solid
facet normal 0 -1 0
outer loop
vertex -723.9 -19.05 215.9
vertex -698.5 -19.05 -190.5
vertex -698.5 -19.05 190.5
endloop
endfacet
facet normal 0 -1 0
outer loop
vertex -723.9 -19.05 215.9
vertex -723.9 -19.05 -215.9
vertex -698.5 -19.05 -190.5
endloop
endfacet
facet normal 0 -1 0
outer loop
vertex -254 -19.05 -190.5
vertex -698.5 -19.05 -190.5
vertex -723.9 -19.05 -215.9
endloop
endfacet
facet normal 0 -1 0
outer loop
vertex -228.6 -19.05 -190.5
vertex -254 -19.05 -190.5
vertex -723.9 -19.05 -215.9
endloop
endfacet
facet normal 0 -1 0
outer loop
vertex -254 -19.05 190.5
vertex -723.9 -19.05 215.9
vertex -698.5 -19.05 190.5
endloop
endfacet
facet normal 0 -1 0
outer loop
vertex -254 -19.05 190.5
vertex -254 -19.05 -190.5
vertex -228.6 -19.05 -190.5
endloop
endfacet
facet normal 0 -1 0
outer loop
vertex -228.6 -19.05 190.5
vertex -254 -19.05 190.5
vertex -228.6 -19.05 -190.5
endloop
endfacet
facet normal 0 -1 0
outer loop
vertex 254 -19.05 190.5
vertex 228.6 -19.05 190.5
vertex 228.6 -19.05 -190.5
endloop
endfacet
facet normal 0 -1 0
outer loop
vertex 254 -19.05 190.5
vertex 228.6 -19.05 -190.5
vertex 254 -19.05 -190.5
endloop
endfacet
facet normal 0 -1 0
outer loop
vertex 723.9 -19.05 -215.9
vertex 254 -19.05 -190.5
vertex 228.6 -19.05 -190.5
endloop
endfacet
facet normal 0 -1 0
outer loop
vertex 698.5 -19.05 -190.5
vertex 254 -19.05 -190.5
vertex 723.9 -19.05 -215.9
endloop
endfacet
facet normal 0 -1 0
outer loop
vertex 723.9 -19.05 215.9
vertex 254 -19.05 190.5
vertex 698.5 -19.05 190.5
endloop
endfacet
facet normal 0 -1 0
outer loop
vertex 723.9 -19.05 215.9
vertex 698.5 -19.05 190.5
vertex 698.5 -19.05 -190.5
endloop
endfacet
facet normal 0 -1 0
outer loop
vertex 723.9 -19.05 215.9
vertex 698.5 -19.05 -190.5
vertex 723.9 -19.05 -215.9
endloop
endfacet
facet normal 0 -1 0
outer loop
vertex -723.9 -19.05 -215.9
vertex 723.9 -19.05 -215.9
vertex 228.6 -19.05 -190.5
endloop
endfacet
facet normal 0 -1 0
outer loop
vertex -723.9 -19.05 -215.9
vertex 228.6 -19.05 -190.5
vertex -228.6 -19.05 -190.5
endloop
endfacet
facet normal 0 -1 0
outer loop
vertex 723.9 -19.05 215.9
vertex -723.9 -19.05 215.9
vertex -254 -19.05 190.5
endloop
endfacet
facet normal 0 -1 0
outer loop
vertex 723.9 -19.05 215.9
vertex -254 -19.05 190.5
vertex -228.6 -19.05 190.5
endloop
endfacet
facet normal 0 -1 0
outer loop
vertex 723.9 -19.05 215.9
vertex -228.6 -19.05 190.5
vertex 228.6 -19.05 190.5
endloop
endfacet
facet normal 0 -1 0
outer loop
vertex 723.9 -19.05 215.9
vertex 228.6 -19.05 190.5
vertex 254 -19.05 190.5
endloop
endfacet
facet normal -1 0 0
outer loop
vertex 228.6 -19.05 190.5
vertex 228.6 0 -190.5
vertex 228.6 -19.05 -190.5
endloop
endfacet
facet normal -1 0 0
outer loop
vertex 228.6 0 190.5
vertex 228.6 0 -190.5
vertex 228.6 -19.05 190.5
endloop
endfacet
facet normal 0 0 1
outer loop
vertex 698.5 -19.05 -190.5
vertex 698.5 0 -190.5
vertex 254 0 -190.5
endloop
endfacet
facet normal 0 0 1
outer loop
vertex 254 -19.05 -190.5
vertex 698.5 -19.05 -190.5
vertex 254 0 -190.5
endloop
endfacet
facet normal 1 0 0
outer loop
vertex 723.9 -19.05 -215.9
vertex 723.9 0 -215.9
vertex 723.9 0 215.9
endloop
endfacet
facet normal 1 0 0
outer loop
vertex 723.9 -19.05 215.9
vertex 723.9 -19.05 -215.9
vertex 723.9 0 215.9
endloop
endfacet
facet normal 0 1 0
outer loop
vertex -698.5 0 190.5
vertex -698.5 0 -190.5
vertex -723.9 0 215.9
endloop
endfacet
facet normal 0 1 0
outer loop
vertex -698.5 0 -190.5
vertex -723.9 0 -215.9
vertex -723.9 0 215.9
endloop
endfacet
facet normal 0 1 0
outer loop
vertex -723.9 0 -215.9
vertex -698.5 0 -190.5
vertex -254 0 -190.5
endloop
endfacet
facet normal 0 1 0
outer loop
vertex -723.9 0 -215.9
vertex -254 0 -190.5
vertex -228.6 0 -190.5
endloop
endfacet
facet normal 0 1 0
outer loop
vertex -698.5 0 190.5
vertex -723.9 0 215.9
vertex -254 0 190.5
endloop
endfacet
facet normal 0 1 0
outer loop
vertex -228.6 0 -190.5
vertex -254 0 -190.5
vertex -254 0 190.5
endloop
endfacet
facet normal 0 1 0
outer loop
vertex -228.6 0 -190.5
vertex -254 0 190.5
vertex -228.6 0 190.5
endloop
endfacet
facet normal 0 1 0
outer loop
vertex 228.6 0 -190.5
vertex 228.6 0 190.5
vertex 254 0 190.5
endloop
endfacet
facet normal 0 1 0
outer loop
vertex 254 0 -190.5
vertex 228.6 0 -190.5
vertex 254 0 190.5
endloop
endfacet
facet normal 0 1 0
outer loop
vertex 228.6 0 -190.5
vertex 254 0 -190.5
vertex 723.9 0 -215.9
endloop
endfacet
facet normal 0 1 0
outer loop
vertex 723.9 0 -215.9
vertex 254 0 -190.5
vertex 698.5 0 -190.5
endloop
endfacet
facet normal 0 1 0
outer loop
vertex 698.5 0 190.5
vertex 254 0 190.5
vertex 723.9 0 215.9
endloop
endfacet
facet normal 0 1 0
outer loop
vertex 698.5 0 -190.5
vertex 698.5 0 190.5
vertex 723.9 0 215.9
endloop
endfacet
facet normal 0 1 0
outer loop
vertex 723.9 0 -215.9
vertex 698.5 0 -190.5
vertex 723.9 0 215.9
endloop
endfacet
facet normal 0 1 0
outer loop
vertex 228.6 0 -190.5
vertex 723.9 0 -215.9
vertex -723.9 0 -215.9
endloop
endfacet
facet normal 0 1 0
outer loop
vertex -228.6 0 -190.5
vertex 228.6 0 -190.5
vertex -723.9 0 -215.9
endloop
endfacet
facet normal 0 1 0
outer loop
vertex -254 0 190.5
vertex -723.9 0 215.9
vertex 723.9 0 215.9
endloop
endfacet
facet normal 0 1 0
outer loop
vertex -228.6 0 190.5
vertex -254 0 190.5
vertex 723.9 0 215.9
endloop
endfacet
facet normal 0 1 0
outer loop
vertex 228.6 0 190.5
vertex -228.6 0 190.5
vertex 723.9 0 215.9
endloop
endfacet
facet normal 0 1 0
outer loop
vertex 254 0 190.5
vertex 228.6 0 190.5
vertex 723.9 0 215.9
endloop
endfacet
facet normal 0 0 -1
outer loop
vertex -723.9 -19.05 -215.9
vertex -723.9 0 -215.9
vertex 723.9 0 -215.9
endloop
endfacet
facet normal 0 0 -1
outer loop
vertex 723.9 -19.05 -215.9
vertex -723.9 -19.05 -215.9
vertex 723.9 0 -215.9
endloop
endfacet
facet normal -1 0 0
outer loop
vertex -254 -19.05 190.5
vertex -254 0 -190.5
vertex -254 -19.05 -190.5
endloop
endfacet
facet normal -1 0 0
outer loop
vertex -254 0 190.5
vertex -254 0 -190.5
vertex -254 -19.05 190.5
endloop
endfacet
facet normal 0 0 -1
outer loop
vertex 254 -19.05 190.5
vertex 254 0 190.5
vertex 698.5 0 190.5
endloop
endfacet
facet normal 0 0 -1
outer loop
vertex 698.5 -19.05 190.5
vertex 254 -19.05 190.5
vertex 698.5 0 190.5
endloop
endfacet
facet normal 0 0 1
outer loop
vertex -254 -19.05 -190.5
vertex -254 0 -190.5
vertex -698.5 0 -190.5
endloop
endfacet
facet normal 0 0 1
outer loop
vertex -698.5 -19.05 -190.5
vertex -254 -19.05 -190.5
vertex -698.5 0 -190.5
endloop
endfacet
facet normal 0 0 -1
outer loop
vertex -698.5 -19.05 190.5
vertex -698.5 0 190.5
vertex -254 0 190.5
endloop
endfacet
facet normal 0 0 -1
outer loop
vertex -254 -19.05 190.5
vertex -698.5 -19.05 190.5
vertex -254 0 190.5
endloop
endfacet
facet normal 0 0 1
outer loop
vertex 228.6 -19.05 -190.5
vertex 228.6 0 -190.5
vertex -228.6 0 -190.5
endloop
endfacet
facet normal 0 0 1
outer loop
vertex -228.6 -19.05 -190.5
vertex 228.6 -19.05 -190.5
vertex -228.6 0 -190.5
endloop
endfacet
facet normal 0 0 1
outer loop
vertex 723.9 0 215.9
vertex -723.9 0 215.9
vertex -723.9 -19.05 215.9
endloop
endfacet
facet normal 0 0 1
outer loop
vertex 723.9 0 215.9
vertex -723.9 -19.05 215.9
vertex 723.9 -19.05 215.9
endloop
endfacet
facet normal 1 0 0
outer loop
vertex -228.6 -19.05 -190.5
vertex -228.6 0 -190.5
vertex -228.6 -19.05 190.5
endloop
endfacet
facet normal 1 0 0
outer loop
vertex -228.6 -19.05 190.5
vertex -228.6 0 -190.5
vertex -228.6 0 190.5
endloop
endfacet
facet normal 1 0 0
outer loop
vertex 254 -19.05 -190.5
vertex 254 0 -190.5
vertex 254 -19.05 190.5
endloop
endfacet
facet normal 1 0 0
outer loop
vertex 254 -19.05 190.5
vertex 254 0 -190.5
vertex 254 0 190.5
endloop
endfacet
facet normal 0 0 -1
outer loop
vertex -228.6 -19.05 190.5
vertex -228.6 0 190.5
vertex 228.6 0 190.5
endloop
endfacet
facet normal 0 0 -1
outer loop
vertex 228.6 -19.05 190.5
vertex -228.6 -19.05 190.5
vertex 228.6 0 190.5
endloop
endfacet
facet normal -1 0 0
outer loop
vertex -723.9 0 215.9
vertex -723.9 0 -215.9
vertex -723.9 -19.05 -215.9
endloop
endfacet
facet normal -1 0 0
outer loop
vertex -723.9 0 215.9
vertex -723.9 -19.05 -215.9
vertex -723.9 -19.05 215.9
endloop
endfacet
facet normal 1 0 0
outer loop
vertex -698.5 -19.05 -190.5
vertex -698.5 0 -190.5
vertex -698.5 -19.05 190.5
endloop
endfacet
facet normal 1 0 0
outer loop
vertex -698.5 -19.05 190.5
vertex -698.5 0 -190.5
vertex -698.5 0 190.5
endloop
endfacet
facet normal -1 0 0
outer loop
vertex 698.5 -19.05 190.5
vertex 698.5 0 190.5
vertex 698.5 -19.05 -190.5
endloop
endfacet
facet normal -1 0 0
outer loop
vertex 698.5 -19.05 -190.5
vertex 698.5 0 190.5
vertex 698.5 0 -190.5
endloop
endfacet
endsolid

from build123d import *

# Parameters (mm, degrees)
F1_W     = 1447.8
F1_H     = 431.8
F1_W_2   = 25.4
F1_H_2   = 381
F2_DEPTH = 19.05


# Not quite as in the source:
# - a variable given as a bare number and used for a length is read in inches; the dataset says mm whatever the document's units were


with BuildPart() as f2:
    # F1 (on Front) → F2 (new body)
    with BuildSketch(Plane.XZ):
        Rectangle(F1_W, F1_H)
        Polygon((-698.5, -190.5), (-698.5, 190.5), (-254, 190.5), (-228.6, 190.5), (228.6, 190.5), (254, 190.5), (698.5, 190.5), (698.5, -190.5), (254, -190.5), (228.6, -190.5), (-228.6, -190.5), (-254, -190.5), align=None, mode=Mode.SUBTRACT)
        with Locations((-241.3, 0)):
            Rectangle(F1_W_2, F1_H_2)
        with Locations((241.3, 0)):
            Rectangle(F1_W_2, F1_H_2)
    extrude(amount=F2_DEPTH)


solid = f2.part
